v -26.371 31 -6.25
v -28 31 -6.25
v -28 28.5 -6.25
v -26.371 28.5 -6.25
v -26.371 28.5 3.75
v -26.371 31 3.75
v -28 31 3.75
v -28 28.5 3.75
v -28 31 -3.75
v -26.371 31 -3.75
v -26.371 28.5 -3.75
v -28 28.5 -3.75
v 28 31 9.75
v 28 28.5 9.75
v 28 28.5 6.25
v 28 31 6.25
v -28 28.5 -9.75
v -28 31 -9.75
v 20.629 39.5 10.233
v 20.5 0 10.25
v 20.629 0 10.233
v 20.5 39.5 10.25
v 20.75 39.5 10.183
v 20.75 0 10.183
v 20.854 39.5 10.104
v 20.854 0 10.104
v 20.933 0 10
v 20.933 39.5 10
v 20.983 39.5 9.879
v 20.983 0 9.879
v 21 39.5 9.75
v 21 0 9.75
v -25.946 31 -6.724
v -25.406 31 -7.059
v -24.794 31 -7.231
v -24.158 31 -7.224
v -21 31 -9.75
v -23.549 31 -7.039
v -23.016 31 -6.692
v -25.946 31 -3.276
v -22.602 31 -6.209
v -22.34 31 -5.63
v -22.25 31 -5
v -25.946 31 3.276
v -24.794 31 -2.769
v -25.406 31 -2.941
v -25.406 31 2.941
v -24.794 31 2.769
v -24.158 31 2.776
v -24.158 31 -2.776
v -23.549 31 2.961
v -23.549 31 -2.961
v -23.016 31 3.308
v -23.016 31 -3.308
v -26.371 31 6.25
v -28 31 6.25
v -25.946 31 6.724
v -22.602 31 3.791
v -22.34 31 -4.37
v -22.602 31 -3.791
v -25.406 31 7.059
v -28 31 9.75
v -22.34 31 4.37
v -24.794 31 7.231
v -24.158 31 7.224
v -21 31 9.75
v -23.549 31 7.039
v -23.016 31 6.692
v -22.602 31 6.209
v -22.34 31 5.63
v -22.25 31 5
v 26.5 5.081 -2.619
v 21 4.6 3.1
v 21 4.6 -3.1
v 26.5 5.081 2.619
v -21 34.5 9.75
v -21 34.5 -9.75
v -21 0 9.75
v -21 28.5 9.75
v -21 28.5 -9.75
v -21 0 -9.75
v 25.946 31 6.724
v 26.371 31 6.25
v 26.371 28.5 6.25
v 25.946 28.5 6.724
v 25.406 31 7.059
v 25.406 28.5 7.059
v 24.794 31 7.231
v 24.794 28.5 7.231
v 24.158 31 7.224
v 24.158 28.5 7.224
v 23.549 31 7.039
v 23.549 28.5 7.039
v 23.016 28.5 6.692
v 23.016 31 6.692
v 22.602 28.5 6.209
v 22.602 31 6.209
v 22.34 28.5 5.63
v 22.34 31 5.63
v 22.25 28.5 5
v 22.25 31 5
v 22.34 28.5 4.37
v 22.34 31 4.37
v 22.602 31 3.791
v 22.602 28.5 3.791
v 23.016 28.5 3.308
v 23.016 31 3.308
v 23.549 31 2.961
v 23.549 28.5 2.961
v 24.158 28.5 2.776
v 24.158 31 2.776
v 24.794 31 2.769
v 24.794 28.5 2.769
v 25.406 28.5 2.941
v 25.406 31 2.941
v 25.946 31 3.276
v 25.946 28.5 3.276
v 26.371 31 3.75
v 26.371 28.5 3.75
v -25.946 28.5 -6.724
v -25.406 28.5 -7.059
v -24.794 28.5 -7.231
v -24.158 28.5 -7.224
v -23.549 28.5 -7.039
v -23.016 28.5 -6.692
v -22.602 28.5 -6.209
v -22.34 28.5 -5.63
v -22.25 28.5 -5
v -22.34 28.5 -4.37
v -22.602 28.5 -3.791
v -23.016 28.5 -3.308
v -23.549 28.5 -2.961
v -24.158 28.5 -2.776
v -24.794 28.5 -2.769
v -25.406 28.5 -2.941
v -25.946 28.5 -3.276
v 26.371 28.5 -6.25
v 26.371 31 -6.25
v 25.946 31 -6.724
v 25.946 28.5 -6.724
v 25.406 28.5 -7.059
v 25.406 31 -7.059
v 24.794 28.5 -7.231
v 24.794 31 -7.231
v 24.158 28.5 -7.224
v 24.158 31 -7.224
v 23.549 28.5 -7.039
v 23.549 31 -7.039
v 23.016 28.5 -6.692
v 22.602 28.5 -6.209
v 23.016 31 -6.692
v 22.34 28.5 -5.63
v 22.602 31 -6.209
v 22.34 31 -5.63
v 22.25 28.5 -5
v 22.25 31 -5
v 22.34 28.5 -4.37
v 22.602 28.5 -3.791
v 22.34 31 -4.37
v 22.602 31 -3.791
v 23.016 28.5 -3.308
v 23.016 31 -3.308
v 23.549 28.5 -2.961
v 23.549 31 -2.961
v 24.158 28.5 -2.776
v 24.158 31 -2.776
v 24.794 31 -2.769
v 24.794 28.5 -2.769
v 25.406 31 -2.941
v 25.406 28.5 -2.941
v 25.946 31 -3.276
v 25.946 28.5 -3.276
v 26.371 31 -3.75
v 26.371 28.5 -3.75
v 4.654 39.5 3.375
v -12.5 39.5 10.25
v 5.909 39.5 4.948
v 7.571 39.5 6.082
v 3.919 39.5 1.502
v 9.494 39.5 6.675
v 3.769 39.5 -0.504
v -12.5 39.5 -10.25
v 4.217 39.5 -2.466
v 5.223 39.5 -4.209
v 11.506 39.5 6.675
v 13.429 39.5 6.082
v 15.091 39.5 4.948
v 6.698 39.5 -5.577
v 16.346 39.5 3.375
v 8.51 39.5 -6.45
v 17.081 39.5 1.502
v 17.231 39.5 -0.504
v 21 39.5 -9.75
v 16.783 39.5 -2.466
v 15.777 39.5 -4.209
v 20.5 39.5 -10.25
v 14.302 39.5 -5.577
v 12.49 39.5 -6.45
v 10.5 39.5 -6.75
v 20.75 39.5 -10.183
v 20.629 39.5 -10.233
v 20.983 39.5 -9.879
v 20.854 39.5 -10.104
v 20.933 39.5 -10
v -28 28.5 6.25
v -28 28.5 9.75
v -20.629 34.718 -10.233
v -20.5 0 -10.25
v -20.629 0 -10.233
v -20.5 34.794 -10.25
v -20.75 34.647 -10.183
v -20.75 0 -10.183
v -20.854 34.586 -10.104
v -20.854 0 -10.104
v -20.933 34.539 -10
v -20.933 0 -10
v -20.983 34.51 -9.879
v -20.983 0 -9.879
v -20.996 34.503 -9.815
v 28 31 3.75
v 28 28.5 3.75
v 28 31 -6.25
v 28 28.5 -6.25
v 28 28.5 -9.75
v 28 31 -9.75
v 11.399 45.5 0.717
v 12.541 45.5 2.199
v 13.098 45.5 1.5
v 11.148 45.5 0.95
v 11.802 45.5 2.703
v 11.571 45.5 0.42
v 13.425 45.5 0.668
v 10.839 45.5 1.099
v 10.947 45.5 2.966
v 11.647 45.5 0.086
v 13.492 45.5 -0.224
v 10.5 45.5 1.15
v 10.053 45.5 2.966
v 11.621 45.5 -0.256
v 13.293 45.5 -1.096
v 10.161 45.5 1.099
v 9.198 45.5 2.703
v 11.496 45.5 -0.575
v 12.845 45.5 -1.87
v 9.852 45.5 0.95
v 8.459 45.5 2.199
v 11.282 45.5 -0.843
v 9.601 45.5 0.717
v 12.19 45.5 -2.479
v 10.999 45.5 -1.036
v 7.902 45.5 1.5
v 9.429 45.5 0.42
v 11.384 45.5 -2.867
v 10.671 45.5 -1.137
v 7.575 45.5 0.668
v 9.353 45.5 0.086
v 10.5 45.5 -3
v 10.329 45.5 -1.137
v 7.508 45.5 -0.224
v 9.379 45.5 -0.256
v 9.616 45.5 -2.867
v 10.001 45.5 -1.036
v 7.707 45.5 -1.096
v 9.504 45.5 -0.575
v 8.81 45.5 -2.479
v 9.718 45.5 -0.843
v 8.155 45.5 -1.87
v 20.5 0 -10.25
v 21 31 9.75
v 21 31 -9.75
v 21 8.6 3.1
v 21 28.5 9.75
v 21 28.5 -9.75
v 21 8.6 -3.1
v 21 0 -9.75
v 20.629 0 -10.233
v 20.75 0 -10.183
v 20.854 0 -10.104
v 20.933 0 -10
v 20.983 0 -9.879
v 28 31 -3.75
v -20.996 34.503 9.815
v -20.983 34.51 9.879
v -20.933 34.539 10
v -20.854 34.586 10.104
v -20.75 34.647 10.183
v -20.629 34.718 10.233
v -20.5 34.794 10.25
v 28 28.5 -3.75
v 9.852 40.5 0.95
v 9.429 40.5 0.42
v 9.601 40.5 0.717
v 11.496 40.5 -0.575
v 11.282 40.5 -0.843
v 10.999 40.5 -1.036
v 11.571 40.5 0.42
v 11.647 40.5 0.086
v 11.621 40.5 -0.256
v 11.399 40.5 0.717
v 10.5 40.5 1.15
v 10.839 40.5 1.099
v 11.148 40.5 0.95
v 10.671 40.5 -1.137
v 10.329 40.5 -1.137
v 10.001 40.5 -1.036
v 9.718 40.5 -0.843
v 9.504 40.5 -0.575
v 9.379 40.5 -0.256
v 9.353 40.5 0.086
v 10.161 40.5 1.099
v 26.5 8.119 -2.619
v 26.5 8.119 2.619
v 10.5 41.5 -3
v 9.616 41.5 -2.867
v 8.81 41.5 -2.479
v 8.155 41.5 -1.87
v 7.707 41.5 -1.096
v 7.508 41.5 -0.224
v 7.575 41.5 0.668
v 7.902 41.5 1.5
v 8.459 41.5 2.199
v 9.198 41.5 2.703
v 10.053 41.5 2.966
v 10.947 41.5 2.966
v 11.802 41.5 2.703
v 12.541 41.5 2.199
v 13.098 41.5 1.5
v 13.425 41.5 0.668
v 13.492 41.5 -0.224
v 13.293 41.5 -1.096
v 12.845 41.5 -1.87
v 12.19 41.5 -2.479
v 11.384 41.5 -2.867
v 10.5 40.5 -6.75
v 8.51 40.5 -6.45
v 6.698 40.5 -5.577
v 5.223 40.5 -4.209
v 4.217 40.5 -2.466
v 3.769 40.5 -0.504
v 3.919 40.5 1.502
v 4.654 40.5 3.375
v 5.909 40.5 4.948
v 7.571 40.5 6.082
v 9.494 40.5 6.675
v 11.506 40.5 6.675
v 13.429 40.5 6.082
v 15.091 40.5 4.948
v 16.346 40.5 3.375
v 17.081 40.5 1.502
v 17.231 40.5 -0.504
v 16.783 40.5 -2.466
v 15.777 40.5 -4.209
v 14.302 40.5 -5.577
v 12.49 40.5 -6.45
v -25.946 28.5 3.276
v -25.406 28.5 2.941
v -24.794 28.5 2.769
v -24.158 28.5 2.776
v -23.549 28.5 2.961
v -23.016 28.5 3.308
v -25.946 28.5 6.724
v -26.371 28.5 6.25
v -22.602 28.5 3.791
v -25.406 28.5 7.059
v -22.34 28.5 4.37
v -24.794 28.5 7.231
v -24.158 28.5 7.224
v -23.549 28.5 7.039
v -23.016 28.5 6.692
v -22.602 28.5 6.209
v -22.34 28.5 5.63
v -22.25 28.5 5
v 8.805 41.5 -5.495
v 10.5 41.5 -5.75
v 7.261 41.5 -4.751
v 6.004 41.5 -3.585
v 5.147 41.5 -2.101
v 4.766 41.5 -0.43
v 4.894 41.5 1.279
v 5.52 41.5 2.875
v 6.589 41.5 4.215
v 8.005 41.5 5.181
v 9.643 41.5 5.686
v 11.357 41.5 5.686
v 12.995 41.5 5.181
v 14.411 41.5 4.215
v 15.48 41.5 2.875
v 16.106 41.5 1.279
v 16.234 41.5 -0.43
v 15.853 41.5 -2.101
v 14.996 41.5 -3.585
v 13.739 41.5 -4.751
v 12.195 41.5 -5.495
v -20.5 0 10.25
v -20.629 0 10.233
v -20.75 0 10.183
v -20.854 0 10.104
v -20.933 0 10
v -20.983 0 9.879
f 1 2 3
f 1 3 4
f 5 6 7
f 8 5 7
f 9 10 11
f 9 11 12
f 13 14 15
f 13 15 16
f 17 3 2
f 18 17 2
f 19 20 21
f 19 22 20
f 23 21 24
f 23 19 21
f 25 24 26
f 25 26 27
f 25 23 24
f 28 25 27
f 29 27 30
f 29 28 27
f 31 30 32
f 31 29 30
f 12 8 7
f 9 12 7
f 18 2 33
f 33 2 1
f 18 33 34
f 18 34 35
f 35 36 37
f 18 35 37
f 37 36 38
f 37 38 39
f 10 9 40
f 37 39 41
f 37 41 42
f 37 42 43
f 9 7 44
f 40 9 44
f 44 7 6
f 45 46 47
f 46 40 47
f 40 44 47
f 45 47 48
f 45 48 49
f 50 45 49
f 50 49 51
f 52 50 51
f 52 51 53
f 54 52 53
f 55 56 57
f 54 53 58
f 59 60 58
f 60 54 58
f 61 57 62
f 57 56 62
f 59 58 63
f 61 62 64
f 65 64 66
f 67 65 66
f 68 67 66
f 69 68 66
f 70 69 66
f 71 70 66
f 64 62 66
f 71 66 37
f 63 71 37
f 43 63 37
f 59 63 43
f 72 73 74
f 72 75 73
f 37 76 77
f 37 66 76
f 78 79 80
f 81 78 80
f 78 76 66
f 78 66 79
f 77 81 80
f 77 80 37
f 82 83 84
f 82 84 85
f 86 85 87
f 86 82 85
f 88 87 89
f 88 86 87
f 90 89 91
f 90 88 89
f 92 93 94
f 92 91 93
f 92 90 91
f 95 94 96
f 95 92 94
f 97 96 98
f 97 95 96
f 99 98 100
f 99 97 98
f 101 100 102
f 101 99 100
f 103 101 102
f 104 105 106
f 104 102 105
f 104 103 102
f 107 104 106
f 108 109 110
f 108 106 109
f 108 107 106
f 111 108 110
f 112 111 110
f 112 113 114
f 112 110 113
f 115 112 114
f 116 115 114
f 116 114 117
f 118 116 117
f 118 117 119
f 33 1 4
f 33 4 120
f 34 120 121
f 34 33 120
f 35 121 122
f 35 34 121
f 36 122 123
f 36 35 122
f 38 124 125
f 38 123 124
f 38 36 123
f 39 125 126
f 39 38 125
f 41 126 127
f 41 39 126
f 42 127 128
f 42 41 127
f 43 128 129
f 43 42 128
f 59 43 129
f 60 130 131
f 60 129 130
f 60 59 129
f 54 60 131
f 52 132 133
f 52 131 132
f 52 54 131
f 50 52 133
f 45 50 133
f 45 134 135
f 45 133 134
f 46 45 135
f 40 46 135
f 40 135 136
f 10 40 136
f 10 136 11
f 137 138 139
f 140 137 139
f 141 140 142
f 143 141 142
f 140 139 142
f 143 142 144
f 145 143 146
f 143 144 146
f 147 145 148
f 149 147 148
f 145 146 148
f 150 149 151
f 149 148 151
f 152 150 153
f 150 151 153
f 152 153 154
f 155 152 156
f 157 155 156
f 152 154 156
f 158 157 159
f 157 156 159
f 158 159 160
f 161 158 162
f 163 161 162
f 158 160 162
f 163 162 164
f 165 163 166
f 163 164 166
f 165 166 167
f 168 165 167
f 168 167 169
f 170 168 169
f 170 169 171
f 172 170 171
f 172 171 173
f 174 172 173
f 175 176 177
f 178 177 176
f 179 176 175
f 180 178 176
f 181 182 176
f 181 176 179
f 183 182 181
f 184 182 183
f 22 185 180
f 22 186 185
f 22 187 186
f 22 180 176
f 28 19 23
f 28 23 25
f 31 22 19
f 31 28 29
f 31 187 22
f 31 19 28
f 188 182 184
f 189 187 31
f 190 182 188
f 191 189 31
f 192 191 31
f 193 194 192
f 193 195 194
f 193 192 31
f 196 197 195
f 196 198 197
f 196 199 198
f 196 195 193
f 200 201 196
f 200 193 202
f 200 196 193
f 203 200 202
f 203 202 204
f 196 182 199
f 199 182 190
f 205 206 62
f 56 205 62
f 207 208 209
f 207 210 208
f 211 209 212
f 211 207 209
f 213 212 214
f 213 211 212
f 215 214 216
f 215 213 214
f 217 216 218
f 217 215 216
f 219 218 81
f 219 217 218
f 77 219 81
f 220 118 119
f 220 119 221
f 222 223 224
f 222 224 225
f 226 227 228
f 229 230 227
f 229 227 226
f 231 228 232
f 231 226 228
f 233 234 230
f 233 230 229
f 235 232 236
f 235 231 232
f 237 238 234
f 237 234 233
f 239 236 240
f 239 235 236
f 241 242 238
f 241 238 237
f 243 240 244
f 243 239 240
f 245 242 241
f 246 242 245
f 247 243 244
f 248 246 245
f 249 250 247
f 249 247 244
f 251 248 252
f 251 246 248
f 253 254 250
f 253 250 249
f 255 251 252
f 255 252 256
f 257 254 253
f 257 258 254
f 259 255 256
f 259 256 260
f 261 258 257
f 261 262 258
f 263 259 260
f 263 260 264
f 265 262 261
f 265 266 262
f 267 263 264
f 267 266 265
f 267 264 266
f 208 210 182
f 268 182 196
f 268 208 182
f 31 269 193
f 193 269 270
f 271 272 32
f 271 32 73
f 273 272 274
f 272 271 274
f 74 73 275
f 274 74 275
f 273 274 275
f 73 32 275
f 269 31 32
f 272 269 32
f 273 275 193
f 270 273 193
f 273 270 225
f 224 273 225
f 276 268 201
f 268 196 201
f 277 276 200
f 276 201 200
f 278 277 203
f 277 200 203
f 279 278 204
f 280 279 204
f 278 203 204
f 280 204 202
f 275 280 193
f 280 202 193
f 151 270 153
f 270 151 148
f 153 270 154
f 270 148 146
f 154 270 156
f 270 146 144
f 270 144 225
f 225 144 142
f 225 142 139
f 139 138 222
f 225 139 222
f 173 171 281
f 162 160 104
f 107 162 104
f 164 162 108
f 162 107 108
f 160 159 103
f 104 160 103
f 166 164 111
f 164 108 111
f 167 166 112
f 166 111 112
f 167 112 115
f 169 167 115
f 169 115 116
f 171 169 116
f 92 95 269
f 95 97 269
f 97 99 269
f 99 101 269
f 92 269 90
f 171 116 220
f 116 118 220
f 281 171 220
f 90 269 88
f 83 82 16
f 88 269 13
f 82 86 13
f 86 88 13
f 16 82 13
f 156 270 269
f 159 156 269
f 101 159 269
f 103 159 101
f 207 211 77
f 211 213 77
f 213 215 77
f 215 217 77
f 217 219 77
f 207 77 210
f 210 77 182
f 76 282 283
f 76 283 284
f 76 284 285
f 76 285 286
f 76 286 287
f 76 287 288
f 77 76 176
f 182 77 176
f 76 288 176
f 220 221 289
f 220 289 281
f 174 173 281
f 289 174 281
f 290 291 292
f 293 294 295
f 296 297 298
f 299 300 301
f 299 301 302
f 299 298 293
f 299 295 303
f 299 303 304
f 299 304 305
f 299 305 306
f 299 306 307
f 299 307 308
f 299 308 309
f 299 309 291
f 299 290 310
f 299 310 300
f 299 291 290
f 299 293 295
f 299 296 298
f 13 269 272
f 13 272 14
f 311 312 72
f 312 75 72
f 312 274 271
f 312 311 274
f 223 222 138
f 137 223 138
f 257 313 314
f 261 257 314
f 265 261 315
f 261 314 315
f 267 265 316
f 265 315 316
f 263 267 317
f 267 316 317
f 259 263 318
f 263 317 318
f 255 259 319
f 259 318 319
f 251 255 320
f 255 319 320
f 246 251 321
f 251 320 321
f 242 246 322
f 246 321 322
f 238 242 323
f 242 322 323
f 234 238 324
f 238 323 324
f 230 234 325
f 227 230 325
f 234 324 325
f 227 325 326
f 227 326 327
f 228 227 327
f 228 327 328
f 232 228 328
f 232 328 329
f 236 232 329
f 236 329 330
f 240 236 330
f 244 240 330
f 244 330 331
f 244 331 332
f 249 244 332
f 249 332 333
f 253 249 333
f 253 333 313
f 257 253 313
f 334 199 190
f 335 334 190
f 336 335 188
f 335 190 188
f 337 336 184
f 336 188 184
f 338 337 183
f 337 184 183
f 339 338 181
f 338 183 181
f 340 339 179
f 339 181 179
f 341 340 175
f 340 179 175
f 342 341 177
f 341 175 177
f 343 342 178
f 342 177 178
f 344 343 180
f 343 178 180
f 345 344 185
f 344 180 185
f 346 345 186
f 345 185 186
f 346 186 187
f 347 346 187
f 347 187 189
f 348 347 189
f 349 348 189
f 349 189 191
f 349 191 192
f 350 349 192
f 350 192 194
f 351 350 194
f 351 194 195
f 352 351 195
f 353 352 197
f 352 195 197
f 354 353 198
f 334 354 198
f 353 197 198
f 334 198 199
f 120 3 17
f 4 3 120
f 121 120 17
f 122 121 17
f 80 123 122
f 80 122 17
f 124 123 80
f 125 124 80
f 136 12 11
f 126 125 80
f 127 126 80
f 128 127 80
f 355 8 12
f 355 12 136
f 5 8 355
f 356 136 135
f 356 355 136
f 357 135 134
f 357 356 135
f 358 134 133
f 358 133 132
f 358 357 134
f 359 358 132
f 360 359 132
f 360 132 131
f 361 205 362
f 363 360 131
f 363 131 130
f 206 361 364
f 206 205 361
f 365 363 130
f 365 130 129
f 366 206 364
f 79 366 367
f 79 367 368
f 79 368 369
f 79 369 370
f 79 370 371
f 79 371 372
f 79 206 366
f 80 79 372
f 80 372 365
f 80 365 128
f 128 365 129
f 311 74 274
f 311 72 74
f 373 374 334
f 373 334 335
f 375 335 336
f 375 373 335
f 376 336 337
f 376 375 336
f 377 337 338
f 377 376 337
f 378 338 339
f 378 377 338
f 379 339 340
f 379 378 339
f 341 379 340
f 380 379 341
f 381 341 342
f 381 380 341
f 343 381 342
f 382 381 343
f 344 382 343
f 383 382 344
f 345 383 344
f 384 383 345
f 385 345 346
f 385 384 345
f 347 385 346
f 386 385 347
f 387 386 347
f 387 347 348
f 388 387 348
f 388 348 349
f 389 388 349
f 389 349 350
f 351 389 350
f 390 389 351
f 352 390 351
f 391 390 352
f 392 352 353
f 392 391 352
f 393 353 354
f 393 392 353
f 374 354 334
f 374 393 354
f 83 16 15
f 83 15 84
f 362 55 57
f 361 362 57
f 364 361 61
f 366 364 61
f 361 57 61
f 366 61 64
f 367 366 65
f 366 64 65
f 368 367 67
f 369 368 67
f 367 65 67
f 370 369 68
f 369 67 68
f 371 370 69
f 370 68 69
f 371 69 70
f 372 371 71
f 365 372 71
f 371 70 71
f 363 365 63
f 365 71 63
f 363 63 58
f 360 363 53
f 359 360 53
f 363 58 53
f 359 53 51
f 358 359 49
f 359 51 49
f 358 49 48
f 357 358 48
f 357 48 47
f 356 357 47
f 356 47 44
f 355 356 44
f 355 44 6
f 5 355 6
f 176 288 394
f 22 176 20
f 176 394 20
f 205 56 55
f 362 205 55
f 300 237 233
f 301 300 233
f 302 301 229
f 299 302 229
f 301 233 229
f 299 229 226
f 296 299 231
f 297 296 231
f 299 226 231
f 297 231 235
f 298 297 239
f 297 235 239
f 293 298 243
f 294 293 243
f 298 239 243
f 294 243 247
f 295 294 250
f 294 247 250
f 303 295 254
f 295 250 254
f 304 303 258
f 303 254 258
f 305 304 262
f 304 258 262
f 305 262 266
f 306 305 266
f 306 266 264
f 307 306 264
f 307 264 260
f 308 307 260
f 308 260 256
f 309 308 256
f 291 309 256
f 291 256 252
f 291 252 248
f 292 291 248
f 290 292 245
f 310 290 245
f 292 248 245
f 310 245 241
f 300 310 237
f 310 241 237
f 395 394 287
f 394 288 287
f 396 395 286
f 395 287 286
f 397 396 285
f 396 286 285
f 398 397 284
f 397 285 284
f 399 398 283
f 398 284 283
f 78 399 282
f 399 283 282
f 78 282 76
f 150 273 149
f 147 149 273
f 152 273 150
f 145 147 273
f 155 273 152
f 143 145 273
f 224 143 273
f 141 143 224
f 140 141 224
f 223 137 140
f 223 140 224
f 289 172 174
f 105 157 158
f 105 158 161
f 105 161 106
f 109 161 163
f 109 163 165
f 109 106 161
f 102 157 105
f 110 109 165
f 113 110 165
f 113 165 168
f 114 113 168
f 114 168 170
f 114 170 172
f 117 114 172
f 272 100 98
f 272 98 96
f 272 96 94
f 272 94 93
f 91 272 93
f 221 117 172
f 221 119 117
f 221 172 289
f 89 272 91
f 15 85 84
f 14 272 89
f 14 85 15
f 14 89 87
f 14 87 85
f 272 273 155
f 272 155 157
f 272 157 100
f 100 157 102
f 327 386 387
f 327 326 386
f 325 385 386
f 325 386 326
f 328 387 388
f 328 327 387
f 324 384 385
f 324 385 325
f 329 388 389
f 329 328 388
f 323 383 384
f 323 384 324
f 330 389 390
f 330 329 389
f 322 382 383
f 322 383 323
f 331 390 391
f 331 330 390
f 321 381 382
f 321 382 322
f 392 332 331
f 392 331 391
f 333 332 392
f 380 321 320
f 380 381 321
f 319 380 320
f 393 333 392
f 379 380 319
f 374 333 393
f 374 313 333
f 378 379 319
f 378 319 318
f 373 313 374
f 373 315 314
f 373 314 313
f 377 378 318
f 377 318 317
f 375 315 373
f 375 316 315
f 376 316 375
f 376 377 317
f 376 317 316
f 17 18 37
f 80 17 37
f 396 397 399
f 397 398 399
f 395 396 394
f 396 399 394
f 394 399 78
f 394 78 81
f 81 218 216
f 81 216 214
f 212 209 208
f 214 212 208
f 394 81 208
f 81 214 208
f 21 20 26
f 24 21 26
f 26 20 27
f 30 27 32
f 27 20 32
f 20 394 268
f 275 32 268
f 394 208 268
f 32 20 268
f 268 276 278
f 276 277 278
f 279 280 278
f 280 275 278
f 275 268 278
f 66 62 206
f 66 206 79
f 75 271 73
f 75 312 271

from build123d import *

# Parameters (mm, degrees)
SKETCH1_W            = 42
SKETCH1_H            = 20.5
BOSS_EXTRUDE1_DEPTH  = 39.5
BOSS_EXTRUDE2_START  = -0.5
SKETCH2_W            = 56
SKETCH2_H            = 2.5
BOSS_EXTRUDE2_DEPTH  = 19.5
CUT_EXTRUDE1_DEPTH   = 40
MIRROR2_COPY_1_DEPTH = 40
CUT_EXTRUDE2_DEPTH   = 40
SKETCH5_R            = 3
BOSS_EXTRUDE3_DEPTH  = 6
SKETCH6_R            = 6.75
BOSS_EXTRUDE4_DEPTH  = 2
SKETCH7_R            = 1.15
CUT_EXTRUDE3_DEPTH   = 5
FILLET1_R            = 0.5
SKETCH8_W            = 6.2
SKETCH8_H            = 4
BOSS_EXTRUDE5_DEPTH  = 5.5
BOSS_EXTRUDE5_TAPER  = 5
CHAMFER1_SIZE        = 1


with BuildPart() as part:
    # Sketch1 → Boss-Extrude1 (new body)
    with BuildSketch(Plane(origin=(0, 0, 0), x_dir=(1, 0, 0), z_dir=(0, 1, 0))):
        Rectangle(SKETCH1_W, SKETCH1_H)
    extrude(amount=BOSS_EXTRUDE1_DEPTH)

    # Sketch2 → Boss-Extrude2 (add)
    with BuildSketch(Plane.XY.offset(10.25).offset(BOSS_EXTRUDE2_START)):
        with Locations((0, 29.75)):
            Rectangle(SKETCH2_W, SKETCH2_H)
    extrude(amount=-BOSS_EXTRUDE2_DEPTH)

    # Sketch3 → Cut-Extrude1 (cut)
    with BuildSketch(Plane(origin=(0, 31, 0), x_dir=(1, 0, 0), z_dir=(0, 1, 0))):
        with BuildLine():
            Line((26.370828693, 3.75), (28, 3.75))
            Line((28, 3.75), (28, 6.25))
            Line((28, 6.25), (26.370828693, 6.25))
            ThreePointArc((26.370828693, 6.25), (22.25, 5), (26.370828693, 3.75))
        make_face()
    cut_extrude1 = extrude(amount=-CUT_EXTRUDE1_DEPTH, mode=Mode.SUBTRACT)

    # Mirror1: Cut-Extrude1 across plane
    add(cut_extrude1.mirror(Plane.XY), mode=Mode.SUBTRACT)

    # Mirror2: Cut-Extrude1 across plane
    add(cut_extrude1.mirror(Plane(origin=(0, 0, 0), x_dir=(0, 0, 1), z_dir=(1, 0, 0))), mode=Mode.SUBTRACT)

    # Mirror2 copy 1 sketch → Mirror2 copy 1 (cut)
    with BuildSketch(Plane(origin=(0, 31, 0), x_dir=(-1, 0, 0), z_dir=(0, 1, 0))):
        with BuildLine():
            Line((26.370828693, 3.75), (28, 3.75))
            Line((28, 3.75), (28, 6.25))
            Line((28, 6.25), (26.370828693, 6.25))
            ThreePointArc((26.370828693, 6.25), (22.25, 5), (26.370828693, 3.75))
        make_face()
    extrude(amount=-MIRROR2_COPY_1_DEPTH, mode=Mode.SUBTRACT)

    # Sketch4 → Cut-Extrude2 (cut)
    with BuildSketch(Plane.XY.offset(10.25)):
        Polygon((-21, 34.5), (-12.5, 39.5), (-12.5, 42.326326537), (-24.476884638, 42.326326537), (-24.476884638, 34.5), align=None)
    extrude(amount=-CUT_EXTRUDE2_DEPTH, mode=Mode.SUBTRACT)

    # Sketch5 → Boss-Extrude3 (add)
    with BuildSketch(Plane(origin=(0, 39.5, 0), x_dir=(1, 0, 0), z_dir=(0, 1, 0))):
        with Locations(Location((10.5, 0, 0), (0, 0, 90))):
            Circle(SKETCH5_R)
    extrude(amount=BOSS_EXTRUDE3_DEPTH)

    # Sketch6 → Boss-Extrude4 (add)
    with BuildSketch(Plane(origin=(0, 39.5, 0), x_dir=(1, 0, 0), z_dir=(0, 1, 0))):
        with Locations(Location((10.5, 0, 0), (0, 0, 90))):
            Circle(SKETCH6_R)
    extrude(amount=BOSS_EXTRUDE4_DEPTH)

    # Sketch7 → Cut-Extrude3 (cut)
    with BuildSketch(Plane(origin=(0, 45.5, 0), x_dir=(1, 0, 0), z_dir=(0, 1, 0))):
        with Locations(Location((10.5, 0, 0), (0, 0, 270))):
            Circle(SKETCH7_R)
    extrude(amount=-CUT_EXTRUDE3_DEPTH, mode=Mode.SUBTRACT)

    # Fillet1
    fillet1_edges = [part.edges().sort_by_distance(p)[0] for p in [
        (-21, 17.25, -10.25),
        (-21, 17.25, 10.25),
        (21, 19.75, -10.25),
        (21, 19.75, 10.25),
    ]]
    fillet(fillet1_edges, radius=FILLET1_R - 0.0001)  # a hair under: the kernel refuses the full size

    # Sketch8 → Boss-Extrude5 (add)
    with BuildSketch(Plane(origin=(21, 0, 0), x_dir=(0, 0, -1), z_dir=(1, 0, 0))):
        with Locations((0, 6.6)):
            Rectangle(SKETCH8_W, SKETCH8_H)
    extrude(amount=BOSS_EXTRUDE5_DEPTH, taper=BOSS_EXTRUDE5_TAPER)

    # Chamfer1
    chamfer1_edges = [part.edges().sort_by_distance(p)[0] for p in [
        (10.5, 41.5, 6.75),
    ]]
    chamfer(chamfer1_edges, length=CHAMFER1_SIZE)


solid = part.part
